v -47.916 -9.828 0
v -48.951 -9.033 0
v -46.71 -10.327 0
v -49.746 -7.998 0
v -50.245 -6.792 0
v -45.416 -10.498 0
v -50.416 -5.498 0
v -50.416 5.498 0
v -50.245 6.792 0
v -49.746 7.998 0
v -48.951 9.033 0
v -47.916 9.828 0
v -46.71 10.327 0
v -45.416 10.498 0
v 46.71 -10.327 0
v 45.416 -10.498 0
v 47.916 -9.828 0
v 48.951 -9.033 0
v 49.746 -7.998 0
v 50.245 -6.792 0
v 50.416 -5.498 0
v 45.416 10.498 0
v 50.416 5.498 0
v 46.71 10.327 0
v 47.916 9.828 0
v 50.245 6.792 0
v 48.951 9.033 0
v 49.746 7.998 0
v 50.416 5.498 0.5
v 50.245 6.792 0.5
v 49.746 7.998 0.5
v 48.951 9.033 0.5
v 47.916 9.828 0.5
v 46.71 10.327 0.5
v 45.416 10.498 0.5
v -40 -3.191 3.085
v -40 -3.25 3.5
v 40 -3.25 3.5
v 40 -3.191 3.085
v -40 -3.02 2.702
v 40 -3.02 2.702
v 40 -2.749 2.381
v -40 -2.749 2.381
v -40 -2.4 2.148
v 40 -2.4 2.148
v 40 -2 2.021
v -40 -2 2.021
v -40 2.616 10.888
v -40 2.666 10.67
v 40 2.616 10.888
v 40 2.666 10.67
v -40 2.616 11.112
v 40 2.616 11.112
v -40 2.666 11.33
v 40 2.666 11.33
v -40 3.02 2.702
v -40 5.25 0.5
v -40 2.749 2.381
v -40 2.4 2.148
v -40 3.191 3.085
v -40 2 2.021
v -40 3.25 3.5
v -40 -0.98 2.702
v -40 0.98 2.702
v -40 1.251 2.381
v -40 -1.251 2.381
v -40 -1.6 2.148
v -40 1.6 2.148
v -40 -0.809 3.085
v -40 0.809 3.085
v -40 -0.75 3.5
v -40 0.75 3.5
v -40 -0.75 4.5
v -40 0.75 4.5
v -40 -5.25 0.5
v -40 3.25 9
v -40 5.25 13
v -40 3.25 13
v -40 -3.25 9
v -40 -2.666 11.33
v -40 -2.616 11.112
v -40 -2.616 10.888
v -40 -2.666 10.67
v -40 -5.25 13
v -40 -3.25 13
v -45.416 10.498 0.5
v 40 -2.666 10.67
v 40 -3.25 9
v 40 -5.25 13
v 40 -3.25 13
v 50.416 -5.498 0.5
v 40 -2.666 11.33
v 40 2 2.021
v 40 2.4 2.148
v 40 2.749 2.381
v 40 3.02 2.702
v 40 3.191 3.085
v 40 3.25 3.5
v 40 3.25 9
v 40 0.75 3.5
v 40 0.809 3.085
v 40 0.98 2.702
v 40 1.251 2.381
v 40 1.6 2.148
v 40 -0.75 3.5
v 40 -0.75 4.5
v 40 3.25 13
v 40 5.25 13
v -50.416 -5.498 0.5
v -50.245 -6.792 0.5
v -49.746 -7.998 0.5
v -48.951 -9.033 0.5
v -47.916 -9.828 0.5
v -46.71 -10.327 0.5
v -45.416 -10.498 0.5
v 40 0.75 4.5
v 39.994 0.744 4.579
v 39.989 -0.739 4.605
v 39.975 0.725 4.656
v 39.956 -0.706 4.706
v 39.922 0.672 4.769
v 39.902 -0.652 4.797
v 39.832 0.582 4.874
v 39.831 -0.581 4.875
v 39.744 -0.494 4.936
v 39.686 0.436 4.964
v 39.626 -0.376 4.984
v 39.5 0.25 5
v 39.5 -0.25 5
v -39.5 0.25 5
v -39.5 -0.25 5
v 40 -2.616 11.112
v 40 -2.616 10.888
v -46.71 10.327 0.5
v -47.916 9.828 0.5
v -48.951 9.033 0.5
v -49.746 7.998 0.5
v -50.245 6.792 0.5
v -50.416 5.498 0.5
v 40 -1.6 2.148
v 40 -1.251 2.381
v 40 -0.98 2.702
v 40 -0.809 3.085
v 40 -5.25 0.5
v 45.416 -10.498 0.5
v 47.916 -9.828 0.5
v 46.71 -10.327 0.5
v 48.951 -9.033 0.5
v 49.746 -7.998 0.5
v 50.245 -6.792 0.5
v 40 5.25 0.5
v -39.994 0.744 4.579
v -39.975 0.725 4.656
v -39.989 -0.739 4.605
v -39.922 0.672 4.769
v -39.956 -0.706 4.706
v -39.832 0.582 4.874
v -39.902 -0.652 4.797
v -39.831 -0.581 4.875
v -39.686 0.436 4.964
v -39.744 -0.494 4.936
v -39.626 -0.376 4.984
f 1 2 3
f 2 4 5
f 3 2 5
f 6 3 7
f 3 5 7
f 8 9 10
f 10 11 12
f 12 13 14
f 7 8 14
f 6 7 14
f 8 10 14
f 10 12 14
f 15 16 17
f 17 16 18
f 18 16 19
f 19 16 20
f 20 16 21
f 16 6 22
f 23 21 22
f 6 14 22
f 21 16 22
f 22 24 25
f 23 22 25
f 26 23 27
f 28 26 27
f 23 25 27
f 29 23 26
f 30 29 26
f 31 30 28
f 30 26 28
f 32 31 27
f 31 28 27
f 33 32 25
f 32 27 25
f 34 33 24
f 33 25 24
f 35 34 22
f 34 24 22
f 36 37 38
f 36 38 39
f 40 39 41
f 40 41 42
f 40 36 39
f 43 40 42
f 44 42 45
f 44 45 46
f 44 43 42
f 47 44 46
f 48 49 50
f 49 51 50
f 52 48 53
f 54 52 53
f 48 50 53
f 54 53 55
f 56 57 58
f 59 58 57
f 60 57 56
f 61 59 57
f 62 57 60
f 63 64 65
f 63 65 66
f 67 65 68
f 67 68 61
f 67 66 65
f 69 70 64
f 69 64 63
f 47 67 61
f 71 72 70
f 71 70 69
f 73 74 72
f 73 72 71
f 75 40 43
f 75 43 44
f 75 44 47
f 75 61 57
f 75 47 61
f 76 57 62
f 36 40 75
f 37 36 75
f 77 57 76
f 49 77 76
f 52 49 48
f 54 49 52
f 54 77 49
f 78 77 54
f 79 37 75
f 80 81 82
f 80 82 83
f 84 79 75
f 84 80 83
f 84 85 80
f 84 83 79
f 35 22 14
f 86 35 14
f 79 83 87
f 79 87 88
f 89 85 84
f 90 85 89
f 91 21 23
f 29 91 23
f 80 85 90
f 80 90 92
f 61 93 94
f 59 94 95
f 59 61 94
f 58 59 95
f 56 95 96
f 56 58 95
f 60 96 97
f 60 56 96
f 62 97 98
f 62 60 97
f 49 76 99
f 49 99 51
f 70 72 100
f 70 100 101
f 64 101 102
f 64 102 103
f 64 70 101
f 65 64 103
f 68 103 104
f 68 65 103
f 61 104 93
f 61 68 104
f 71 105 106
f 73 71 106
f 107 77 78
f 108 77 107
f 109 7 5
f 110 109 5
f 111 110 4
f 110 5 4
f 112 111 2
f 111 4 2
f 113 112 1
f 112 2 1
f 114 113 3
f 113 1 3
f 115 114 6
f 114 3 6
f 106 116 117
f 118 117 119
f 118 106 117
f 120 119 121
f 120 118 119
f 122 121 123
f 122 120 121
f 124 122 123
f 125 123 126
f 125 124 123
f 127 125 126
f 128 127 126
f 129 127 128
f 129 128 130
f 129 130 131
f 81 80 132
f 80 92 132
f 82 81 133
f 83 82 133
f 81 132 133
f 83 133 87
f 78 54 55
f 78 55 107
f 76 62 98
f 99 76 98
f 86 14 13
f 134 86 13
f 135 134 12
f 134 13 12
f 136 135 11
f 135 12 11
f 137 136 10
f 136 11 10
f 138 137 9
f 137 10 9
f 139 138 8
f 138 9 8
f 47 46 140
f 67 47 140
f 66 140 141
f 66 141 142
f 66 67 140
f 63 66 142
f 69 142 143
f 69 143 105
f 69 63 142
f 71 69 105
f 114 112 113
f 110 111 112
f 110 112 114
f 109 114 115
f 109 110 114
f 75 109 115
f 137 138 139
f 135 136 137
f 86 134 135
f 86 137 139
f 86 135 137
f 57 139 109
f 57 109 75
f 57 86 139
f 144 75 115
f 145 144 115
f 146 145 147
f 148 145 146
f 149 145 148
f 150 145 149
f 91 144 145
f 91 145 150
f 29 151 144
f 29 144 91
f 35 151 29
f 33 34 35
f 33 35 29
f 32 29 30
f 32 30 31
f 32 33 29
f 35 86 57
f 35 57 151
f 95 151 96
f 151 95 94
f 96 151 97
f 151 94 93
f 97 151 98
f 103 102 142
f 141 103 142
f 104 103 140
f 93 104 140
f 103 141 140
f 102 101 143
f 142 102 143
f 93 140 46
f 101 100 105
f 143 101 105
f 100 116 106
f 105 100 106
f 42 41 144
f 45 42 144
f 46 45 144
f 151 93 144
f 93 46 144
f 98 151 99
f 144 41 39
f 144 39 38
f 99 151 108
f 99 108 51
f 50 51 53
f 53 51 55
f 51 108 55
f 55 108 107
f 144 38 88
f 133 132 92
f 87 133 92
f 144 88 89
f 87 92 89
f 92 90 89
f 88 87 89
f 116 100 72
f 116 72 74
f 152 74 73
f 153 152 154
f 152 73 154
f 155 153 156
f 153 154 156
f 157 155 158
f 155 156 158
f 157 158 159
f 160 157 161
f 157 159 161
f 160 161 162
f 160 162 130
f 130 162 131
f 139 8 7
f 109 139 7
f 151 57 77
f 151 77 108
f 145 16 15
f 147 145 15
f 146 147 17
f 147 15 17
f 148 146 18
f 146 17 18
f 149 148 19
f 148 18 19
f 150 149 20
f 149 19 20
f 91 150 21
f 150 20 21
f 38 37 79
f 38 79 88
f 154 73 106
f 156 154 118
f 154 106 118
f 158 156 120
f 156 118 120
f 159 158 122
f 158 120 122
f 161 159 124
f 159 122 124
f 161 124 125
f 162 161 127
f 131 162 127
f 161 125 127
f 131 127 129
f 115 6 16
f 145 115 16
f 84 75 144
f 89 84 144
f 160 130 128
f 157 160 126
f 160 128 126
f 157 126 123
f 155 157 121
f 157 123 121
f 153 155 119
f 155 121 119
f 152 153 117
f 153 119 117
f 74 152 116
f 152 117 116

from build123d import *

# Parameters (mm, degrees)
F0_W        = 80
F0_H        = 6.5
F1_DEPTH    = 2
F0_H_2      = 2
F2_DEPTH    = 13
F3_W        = 1.5
F3_H        = 3
F4_DEPTH    = 80
F5_R        = 1
F6_R        = 1
F7_T1_DEPTH = 80
F8_R        = 0.5
F9_DEPTH    = 0.5


# Not quite as in the source:
# - a fillet or chamfer that OpenCascade refuses, or shapes differently, is made with other operations: its cross-section is extruded or revolved along the edge and cut away or added
# - a feature names something its author has since deleted; it is built from what else it names


with BuildPart() as f1:
    # F0 (on Top) → F1 (new body)
    with BuildSketch(Plane.XY):
        Rectangle(F0_W, F0_H)
    extrude(amount=F1_DEPTH)

    # F0 (on Top) → F2 (join)
    with BuildSketch(Plane.XY):
        with Locations((0, 4.25)):
            Rectangle(F0_W, F0_H_2)
        with Locations((0, -4.25)):
            Rectangle(F0_W, F0_H_2)
    extrude(amount=F2_DEPTH)

    # F3 (on face) → F4 (join)
    with BuildSketch(Plane(origin=(-40, 0, 0), x_dir=(0, -1, 0), z_dir=(-1, 0, 0))):
        Polygon((-3.25, 13), (-3.25, 9), (-2.55, 11), align=None)
        Polygon((2.55, 11), (3.25, 9), (3.25, 13), align=None)
        with Locations((0, 3.5)):
            Rectangle(F3_W, F3_H)
    extrude(amount=-F4_DEPTH)

    # F5
    f5_edges = [f1.edges().sort_by_distance(p)[0] for p in [
        (0, 2.55, 11),
    ]]
    fillet(f5_edges, radius=F5_R)

    # F6
    f6_edges = [f1.edges().sort_by_distance(p)[0] for p in [
        (0, -2.55, 11),
    ]]
    fillet(f6_edges, radius=F6_R)

    # F7: fillet of radius 1.5 on 4 edges, made by hand

    # F7_s2 → F7_t1 (join)
    with BuildSketch(Plane.YZ.offset(-40)):
        with BuildLine():
            ThreePointArc((-3.25, 3.5), (-2.8106601718, 2.4393398282), (-1.75, 2))
            Line((-1.75, 2), (-3.25, 2))
            Line((-3.25, 2), (-3.25, 3.5))
        make_face()
        with BuildLine():
            ThreePointArc((1.75, 2), (2.8106601718, 2.4393398282), (3.25, 3.5))
            Line((3.25, 3.5), (3.25, 2))
            Line((3.25, 2), (1.75, 2))
        make_face()
        with BuildLine():
            ThreePointArc((-2.25, 2), (-1.1893398282, 2.4393398282), (-0.75, 3.5))
            Line((-0.75, 3.5), (-0.75, 2))
            Line((-0.75, 2), (-2.25, 2))
        make_face()
        with BuildLine():
            ThreePointArc((0.75, 3.5), (1.1893398282, 2.4393398282), (2.25, 2))
            Line((2.25, 2), (0.75, 2))
            Line((0.75, 2), (0.75, 3.5))
        make_face()
    extrude(amount=F7_T1_DEPTH)

    # F8
    f8_edges = [f1.edges().sort_by_distance(p)[0] for p in [
        (0, -0.75, 5),
        (0, 0.75, 5),
        (-40, 0, 5),
        (40, 0, 5),
    ]]
    fillet(f8_edges, radius=F8_R)

    # F0 (on Top) → F9 (join)
    with BuildSketch(Plane.XY):
        with BuildLine():
            ThreePointArc((50.4157468677, 5.4975104332), (48.9512807736, 9.0330443391), (45.4157468677, 10.4975104332))
            Line((45.4157468677, 10.4975104332), (-45.4157468677, 10.4975104332))
            ThreePointArc((-45.4157468677, 10.4975104332), (-48.9512807736, 9.0330443391), (-50.4157468677, 5.4975104332))
            Line((-50.4157468677, 5.4975104332), (-50.4157468677, -5.4975104332))
            ThreePointArc((-50.4157468677, -5.4975104332), (-48.9512807736, -9.0330443391), (-45.4157468677, -10.4975104332))
            Line((-45.4157468677, -10.4975104332), (45.4157468677, -10.4975104332))
            ThreePointArc((45.4157468677, -10.4975104332), (48.9512807736, -9.0330443391), (50.4157468677, -5.4975104332))
            Line((50.4157468677, -5.4975104332), (50.4157468677, 5.4975104332))
        make_face()
        Polygon((-40, 5.25), (40, 5.25), (40, 3.25), (40, -3.25), (40, -5.25), (-40, -5.25), (-40, -3.25), (-40, 3.25), align=None, mode=Mode.SUBTRACT)
    extrude(amount=F9_DEPTH)


solid = f1.part
